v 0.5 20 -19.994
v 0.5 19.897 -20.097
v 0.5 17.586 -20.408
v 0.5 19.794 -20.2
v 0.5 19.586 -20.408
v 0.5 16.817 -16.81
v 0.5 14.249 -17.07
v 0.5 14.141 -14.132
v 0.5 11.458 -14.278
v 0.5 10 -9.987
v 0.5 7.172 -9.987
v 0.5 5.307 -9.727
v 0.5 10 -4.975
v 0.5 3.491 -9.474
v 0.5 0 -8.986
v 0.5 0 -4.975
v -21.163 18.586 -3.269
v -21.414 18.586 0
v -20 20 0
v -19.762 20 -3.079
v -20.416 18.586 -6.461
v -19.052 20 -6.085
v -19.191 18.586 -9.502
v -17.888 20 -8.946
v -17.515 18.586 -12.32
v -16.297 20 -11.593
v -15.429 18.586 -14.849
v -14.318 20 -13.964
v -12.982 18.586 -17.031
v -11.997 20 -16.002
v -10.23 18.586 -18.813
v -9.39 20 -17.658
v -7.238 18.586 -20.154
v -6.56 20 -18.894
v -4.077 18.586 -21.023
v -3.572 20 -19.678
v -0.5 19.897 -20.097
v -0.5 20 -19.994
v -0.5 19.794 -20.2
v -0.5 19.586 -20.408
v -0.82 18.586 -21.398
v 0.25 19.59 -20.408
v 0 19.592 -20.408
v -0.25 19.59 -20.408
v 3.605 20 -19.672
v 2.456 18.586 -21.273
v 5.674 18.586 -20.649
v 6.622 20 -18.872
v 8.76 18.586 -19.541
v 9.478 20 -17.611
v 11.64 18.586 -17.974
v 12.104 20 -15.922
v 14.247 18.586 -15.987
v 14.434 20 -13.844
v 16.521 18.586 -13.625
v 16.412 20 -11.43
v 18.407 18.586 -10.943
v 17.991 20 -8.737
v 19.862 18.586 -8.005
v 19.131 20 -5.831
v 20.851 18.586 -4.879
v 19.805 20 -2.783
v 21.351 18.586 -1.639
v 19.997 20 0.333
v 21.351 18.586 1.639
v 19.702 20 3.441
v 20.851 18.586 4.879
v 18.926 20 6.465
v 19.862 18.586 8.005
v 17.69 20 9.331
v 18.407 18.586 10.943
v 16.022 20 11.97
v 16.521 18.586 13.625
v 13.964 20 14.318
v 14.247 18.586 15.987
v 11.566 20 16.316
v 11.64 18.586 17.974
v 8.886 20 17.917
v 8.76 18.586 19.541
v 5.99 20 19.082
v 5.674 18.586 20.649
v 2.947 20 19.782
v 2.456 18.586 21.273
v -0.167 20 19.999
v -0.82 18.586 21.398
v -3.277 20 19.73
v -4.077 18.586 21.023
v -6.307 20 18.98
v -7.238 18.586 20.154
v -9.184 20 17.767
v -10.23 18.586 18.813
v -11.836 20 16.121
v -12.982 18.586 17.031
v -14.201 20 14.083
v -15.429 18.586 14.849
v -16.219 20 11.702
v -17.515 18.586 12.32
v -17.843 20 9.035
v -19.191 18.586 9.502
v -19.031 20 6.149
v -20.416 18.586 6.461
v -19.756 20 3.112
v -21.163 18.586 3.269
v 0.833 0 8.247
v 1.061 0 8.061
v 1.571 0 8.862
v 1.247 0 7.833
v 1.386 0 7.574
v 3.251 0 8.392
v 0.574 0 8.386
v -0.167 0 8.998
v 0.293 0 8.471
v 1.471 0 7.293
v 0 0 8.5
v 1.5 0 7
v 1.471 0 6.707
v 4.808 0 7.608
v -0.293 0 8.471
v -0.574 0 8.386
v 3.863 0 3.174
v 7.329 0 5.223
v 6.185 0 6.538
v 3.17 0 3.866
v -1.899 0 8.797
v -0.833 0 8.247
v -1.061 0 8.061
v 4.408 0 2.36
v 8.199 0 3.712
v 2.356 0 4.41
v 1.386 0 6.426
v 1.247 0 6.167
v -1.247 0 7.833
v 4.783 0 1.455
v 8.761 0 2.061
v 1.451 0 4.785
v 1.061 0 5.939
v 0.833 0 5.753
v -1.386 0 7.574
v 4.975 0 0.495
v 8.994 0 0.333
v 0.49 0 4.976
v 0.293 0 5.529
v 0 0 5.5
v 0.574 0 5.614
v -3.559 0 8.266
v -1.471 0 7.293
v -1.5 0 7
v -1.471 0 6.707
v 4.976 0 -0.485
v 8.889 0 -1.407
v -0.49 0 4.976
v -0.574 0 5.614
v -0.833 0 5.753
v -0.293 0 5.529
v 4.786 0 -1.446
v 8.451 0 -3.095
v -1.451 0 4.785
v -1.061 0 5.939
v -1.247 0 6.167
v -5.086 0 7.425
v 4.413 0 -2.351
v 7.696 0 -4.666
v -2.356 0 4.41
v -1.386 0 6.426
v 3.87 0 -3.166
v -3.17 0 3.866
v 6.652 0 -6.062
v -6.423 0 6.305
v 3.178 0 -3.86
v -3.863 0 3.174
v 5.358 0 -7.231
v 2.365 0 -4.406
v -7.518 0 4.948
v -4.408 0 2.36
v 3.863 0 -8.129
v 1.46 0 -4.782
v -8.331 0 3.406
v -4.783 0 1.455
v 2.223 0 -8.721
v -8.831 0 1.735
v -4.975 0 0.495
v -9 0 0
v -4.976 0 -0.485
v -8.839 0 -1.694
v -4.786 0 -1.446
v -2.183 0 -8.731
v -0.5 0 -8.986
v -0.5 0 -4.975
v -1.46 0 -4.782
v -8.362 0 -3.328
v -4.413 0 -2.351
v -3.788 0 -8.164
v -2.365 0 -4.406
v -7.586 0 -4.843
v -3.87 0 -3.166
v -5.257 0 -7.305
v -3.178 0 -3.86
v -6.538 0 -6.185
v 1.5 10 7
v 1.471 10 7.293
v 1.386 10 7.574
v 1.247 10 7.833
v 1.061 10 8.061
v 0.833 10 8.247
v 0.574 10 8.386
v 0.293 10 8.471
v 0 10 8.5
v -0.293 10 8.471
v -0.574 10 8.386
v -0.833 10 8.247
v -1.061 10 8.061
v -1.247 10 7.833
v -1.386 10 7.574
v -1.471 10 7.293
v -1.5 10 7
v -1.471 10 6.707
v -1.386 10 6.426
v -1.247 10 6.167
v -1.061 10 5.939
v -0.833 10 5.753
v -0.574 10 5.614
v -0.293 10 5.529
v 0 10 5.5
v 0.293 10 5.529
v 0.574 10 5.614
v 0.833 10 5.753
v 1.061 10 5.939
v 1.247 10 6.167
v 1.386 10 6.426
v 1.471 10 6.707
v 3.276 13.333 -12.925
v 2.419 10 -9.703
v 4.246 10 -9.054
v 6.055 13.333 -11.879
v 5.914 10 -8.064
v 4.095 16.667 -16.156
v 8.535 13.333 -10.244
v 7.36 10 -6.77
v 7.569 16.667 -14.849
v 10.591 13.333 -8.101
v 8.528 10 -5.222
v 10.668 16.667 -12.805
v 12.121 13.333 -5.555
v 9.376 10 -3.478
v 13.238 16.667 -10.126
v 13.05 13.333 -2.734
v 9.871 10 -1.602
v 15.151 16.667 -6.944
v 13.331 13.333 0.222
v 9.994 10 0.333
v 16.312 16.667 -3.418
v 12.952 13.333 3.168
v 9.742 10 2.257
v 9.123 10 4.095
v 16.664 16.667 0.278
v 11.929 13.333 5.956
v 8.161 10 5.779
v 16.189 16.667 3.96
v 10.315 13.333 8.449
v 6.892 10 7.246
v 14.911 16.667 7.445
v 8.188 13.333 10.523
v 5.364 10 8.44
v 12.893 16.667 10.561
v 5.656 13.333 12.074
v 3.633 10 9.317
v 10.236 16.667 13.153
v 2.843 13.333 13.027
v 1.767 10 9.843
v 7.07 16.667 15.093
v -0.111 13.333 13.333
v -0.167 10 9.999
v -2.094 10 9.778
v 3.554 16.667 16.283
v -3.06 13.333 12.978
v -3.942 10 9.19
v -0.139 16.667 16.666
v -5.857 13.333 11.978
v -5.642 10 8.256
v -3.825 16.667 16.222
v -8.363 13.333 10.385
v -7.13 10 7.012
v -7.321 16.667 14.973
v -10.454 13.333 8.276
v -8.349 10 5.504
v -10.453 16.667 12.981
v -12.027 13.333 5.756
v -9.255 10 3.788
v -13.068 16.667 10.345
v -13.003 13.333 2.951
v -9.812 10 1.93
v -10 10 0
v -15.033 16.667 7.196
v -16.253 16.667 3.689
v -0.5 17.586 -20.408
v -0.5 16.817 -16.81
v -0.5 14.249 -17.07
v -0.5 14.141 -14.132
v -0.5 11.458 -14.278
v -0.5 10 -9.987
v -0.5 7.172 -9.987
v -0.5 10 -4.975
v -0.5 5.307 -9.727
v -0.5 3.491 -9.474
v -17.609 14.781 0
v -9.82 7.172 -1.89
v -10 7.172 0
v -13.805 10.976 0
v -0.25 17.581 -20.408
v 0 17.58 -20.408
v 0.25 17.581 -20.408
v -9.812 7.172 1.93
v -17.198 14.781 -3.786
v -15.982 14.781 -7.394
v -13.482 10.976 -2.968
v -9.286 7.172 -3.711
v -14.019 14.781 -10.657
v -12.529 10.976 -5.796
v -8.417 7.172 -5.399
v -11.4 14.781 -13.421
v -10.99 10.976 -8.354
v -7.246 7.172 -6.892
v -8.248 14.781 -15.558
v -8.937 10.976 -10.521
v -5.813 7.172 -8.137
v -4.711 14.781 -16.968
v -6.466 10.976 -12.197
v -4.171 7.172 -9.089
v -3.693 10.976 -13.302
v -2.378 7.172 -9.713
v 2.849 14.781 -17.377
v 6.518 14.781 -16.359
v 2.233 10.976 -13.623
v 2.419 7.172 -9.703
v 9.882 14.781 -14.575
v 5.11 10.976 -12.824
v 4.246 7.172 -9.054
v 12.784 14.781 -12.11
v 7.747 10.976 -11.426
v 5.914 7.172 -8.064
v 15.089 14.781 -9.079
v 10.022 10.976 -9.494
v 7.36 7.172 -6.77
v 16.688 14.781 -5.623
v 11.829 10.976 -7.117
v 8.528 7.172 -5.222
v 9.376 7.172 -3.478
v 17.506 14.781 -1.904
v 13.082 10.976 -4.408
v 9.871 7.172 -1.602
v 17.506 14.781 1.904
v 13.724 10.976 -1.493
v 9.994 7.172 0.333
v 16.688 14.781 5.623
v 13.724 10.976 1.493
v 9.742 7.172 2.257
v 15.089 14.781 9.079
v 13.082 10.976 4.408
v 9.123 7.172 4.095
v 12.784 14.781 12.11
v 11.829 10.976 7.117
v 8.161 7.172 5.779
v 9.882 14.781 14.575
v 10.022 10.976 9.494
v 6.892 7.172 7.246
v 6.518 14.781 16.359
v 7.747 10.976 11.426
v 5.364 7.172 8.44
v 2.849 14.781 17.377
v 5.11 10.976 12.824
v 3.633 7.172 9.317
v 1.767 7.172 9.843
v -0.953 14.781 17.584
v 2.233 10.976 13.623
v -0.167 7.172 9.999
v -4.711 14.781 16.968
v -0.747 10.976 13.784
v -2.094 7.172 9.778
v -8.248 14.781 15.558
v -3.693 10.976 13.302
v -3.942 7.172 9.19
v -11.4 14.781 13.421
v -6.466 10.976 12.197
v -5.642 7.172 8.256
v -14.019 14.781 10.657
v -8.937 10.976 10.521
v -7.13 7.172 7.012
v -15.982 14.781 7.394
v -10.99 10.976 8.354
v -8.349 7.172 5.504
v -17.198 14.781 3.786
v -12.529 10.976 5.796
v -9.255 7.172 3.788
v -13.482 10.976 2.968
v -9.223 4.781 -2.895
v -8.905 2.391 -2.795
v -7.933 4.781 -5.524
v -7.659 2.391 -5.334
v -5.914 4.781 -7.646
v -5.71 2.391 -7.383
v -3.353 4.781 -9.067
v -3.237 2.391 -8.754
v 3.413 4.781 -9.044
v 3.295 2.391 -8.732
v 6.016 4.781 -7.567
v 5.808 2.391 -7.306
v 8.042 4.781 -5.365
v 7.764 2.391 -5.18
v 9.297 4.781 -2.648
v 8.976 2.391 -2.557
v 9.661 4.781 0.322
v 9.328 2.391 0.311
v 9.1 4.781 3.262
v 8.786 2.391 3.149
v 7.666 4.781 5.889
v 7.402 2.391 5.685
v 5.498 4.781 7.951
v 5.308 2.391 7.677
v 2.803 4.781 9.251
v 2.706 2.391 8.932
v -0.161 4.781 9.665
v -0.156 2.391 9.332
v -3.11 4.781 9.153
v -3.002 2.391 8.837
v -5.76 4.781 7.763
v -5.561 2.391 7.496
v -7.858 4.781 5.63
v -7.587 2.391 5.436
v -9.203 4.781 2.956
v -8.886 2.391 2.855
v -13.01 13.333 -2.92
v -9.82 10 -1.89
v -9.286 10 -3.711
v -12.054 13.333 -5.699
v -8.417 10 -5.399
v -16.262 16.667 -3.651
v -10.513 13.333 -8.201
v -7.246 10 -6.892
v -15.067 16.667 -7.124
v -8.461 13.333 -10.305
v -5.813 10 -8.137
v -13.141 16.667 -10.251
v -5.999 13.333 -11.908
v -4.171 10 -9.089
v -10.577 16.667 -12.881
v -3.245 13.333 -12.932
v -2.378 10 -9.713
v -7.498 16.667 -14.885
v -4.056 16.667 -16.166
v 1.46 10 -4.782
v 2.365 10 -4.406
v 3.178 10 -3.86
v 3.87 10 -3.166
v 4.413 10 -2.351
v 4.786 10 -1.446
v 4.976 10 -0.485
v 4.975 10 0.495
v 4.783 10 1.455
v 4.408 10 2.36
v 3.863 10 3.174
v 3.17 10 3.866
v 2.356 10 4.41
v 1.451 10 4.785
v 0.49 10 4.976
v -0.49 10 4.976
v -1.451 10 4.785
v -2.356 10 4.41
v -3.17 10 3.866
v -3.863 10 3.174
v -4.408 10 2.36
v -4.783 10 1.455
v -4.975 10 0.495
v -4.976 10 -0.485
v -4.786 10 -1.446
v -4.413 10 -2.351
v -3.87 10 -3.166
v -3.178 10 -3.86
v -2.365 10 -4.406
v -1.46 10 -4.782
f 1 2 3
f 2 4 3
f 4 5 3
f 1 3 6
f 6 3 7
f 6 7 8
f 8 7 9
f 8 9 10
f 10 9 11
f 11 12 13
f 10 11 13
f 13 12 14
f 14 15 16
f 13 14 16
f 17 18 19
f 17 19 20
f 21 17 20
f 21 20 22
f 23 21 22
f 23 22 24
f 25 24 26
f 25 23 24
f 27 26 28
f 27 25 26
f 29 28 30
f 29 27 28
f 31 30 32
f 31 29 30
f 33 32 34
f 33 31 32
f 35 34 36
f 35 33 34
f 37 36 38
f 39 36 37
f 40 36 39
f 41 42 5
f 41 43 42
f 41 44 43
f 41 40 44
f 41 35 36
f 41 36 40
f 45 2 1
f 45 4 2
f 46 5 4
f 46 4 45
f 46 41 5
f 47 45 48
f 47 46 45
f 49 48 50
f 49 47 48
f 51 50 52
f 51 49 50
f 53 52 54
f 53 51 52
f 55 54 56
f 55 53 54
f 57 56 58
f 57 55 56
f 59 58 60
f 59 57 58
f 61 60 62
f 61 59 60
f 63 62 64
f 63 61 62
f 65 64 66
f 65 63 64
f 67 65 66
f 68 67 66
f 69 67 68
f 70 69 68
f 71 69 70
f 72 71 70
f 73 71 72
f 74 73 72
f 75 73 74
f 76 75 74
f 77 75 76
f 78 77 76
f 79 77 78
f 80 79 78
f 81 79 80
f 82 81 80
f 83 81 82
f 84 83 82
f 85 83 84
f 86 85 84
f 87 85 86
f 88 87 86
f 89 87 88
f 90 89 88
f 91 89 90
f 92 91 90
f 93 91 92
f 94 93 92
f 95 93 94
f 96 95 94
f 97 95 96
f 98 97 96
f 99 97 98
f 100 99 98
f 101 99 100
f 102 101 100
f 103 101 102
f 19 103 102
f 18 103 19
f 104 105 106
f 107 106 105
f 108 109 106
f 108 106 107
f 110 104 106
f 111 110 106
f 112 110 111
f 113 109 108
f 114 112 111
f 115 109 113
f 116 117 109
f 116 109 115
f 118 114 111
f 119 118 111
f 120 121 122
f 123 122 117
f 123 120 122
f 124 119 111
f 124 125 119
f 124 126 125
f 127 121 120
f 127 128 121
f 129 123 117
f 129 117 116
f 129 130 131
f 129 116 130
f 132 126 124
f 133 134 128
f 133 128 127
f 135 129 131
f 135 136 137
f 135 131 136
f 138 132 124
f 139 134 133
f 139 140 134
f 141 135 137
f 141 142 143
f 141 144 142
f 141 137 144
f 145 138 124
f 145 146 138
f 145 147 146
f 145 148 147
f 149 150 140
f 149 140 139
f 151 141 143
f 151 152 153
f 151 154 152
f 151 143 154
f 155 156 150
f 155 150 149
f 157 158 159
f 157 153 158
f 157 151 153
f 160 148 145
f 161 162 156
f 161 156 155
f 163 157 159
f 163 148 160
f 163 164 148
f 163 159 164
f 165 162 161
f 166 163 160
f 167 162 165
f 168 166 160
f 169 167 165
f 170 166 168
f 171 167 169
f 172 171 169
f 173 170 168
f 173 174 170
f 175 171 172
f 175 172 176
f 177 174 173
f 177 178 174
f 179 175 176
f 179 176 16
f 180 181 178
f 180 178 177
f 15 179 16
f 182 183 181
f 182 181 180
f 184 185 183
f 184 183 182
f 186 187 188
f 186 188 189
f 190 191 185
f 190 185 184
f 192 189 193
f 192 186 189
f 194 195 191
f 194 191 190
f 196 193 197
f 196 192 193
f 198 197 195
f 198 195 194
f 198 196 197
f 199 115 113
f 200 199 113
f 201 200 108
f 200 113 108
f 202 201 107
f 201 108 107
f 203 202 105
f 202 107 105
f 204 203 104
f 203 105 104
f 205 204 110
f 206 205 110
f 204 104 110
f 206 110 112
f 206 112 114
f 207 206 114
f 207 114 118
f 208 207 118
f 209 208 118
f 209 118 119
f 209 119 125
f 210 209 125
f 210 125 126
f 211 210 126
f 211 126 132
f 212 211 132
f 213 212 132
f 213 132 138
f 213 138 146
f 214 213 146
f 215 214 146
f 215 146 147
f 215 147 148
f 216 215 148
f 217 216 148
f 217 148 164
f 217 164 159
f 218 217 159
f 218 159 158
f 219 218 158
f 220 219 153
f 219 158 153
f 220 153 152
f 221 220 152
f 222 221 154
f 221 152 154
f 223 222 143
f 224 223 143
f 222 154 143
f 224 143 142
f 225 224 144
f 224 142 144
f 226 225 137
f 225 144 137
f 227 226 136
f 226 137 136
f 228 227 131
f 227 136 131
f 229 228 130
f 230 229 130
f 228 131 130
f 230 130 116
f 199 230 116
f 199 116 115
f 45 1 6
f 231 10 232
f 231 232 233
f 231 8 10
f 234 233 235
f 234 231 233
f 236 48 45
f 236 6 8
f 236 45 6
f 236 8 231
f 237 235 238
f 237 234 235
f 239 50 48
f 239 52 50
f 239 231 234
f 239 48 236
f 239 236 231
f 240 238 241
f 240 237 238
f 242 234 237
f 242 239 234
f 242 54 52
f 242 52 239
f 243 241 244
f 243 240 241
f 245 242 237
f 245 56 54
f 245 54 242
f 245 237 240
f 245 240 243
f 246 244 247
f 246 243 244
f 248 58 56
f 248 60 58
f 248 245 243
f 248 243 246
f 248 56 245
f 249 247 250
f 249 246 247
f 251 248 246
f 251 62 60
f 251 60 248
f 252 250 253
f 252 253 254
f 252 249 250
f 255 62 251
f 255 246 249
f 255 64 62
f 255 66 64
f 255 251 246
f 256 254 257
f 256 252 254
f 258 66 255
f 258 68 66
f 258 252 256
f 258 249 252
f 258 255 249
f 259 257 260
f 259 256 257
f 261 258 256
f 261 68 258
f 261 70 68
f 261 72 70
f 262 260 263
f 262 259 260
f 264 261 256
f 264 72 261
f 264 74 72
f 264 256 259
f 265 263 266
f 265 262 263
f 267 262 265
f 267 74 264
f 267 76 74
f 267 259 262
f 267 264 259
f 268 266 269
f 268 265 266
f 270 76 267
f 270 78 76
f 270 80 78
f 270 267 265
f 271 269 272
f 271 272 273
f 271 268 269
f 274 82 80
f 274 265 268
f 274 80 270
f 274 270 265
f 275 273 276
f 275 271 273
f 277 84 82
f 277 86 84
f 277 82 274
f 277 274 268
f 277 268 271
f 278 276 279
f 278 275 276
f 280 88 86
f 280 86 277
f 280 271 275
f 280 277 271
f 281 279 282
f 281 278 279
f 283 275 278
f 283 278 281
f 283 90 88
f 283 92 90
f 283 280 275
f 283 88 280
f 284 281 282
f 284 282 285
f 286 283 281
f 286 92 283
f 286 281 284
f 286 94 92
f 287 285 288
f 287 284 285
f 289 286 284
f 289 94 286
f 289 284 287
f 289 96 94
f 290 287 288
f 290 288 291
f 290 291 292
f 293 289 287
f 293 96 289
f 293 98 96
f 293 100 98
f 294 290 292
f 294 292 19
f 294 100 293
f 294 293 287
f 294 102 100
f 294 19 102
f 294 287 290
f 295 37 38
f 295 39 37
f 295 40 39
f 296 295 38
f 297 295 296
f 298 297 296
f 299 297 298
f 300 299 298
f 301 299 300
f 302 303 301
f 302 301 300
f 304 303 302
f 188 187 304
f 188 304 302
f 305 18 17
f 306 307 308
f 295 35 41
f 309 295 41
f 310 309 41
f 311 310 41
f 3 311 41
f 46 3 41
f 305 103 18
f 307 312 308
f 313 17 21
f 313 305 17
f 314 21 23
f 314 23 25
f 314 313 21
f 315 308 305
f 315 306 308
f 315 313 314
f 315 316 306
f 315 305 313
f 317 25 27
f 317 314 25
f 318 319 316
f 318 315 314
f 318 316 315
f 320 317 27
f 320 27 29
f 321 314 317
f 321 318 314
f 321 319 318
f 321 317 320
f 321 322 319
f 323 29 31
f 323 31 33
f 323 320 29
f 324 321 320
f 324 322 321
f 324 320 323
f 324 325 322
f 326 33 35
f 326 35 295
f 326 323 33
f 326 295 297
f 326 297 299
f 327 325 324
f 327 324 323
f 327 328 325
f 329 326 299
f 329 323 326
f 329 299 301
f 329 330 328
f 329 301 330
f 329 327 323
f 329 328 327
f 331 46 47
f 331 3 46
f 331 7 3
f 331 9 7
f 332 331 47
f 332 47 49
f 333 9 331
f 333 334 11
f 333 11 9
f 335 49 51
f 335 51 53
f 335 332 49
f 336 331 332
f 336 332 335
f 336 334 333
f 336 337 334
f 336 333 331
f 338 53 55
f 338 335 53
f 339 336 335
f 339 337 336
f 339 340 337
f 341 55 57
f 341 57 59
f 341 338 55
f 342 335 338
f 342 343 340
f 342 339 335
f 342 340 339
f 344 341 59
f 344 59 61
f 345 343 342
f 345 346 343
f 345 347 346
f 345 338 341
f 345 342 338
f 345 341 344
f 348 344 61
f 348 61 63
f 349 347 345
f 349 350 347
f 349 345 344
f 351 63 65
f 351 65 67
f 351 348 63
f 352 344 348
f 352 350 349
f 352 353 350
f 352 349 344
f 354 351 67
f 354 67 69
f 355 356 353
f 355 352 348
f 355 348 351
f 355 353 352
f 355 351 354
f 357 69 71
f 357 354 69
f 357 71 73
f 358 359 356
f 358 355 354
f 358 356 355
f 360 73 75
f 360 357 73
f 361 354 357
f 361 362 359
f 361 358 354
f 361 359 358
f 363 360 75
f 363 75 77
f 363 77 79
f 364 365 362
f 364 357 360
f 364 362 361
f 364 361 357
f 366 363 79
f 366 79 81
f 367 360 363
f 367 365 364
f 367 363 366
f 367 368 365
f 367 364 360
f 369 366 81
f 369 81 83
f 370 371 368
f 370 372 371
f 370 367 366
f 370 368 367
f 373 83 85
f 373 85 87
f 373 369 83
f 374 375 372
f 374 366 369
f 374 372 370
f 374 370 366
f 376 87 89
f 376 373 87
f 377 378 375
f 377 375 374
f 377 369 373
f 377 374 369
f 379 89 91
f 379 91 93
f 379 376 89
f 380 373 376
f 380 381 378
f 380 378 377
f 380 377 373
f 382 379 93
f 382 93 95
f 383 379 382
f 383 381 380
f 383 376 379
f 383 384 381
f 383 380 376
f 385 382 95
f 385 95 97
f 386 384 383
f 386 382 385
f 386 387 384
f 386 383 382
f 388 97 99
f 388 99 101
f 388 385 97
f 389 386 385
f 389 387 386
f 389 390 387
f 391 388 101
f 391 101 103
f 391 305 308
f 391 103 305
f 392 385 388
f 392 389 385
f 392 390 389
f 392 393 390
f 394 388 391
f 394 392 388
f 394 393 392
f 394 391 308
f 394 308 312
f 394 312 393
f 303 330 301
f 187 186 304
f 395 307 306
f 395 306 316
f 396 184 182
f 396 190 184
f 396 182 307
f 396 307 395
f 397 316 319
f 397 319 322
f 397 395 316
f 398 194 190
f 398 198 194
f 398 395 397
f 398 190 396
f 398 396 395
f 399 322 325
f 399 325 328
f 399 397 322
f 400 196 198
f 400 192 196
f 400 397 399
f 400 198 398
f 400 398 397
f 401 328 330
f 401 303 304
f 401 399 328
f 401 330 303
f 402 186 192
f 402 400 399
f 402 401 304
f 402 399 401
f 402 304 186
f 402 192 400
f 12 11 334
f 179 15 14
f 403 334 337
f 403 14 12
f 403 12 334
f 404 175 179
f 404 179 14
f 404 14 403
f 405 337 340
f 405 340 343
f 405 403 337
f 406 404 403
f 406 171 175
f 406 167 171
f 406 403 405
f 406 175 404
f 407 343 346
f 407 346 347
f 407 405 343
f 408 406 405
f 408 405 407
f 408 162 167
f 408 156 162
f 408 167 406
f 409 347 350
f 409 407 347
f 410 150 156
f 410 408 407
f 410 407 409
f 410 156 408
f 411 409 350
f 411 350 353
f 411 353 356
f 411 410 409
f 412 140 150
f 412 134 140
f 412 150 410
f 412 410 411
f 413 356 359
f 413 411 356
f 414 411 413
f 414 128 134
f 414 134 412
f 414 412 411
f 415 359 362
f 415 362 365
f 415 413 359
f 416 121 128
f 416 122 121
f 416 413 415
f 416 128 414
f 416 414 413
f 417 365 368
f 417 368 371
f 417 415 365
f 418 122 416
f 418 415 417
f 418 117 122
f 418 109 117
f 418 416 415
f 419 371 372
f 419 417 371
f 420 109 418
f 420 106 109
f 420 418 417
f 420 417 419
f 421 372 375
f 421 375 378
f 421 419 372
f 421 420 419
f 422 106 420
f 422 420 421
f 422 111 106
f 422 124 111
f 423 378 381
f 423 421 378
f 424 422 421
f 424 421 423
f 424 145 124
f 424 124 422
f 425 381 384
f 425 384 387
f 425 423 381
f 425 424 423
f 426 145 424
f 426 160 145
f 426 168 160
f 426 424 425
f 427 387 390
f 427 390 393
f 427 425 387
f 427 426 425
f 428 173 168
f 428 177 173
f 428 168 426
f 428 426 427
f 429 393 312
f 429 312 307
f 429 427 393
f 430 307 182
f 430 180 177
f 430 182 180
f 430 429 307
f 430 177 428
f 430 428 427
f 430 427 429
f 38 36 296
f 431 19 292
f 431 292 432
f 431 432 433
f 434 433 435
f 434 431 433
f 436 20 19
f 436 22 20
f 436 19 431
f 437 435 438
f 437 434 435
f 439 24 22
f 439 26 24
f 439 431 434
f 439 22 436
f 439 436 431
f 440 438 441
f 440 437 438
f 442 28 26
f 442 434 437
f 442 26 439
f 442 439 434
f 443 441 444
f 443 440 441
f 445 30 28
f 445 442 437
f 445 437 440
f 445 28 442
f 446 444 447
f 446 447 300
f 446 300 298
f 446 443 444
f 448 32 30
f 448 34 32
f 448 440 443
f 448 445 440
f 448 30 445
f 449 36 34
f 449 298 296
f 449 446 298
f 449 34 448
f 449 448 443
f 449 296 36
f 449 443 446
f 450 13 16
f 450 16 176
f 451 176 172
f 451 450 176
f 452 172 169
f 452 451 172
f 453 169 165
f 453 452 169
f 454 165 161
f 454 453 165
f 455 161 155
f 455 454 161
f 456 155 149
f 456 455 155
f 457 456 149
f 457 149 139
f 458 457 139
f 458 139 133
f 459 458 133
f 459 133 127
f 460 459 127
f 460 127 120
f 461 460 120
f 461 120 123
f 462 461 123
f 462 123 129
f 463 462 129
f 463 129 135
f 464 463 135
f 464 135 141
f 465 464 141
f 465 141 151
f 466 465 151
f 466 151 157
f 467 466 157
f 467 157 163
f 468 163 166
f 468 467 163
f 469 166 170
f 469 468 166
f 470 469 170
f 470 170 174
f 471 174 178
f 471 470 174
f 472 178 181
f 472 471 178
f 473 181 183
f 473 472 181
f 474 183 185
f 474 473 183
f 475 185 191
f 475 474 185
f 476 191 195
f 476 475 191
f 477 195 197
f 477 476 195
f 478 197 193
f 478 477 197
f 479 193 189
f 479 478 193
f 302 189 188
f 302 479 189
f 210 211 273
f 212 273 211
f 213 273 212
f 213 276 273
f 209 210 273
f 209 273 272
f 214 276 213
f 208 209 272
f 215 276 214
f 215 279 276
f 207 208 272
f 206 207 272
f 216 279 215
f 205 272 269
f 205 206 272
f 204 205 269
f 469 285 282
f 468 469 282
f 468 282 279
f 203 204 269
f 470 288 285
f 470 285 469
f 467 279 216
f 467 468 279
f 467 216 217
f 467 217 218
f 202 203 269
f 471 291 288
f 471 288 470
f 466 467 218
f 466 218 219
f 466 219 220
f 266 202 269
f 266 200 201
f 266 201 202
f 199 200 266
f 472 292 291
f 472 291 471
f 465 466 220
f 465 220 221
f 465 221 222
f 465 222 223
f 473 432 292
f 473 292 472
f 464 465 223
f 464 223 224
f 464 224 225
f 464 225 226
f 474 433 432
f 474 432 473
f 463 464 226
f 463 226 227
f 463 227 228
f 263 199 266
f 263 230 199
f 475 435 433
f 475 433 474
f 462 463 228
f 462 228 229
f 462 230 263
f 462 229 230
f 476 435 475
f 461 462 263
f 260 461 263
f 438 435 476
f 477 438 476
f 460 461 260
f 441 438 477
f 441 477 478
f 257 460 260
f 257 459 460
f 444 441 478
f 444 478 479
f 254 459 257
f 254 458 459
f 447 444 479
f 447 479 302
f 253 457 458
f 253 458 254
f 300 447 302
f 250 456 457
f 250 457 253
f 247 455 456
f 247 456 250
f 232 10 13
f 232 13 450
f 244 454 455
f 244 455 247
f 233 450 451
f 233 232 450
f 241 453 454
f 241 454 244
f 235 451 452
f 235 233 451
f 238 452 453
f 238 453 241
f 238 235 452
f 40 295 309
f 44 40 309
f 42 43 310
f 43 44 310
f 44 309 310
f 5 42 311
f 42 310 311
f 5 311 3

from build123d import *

# Parameters (mm, degrees)
F2_R     = 1.5
F3_DEPTH = 20.001
F4_W     = 1
F4_H     = 20.408089
F5_DEPTH = 25


with BuildPart() as f1:
    # F0 (on Top) → F1 (revolve)
    with BuildSketch(Plane.XY):
        Polygon((-10, 10), (-20, 20), (-21.414214, 18.585786), (-10, 7.171573), (-9, 0), (-5, 0), (-5, 10), align=None)
    revolve(axis=Axis((0, -1.348249, 0), (0, -1, 0)))

    # F2 (on face) → F3 (cut, through all)
    with BuildSketch(Plane.XZ):
        with Locations((0, 7)):
            Circle(F2_R)
    extrude(amount=-F3_DEPTH, mode=Mode.SUBTRACT)

    # F4 (on face) → F5 (cut)
    with BuildSketch(Plane.XZ):
        with Locations((0, -10.204045)):
            Rectangle(F4_W, F4_H)
    extrude(amount=-F5_DEPTH, mode=Mode.SUBTRACT)


solid = f1.part
